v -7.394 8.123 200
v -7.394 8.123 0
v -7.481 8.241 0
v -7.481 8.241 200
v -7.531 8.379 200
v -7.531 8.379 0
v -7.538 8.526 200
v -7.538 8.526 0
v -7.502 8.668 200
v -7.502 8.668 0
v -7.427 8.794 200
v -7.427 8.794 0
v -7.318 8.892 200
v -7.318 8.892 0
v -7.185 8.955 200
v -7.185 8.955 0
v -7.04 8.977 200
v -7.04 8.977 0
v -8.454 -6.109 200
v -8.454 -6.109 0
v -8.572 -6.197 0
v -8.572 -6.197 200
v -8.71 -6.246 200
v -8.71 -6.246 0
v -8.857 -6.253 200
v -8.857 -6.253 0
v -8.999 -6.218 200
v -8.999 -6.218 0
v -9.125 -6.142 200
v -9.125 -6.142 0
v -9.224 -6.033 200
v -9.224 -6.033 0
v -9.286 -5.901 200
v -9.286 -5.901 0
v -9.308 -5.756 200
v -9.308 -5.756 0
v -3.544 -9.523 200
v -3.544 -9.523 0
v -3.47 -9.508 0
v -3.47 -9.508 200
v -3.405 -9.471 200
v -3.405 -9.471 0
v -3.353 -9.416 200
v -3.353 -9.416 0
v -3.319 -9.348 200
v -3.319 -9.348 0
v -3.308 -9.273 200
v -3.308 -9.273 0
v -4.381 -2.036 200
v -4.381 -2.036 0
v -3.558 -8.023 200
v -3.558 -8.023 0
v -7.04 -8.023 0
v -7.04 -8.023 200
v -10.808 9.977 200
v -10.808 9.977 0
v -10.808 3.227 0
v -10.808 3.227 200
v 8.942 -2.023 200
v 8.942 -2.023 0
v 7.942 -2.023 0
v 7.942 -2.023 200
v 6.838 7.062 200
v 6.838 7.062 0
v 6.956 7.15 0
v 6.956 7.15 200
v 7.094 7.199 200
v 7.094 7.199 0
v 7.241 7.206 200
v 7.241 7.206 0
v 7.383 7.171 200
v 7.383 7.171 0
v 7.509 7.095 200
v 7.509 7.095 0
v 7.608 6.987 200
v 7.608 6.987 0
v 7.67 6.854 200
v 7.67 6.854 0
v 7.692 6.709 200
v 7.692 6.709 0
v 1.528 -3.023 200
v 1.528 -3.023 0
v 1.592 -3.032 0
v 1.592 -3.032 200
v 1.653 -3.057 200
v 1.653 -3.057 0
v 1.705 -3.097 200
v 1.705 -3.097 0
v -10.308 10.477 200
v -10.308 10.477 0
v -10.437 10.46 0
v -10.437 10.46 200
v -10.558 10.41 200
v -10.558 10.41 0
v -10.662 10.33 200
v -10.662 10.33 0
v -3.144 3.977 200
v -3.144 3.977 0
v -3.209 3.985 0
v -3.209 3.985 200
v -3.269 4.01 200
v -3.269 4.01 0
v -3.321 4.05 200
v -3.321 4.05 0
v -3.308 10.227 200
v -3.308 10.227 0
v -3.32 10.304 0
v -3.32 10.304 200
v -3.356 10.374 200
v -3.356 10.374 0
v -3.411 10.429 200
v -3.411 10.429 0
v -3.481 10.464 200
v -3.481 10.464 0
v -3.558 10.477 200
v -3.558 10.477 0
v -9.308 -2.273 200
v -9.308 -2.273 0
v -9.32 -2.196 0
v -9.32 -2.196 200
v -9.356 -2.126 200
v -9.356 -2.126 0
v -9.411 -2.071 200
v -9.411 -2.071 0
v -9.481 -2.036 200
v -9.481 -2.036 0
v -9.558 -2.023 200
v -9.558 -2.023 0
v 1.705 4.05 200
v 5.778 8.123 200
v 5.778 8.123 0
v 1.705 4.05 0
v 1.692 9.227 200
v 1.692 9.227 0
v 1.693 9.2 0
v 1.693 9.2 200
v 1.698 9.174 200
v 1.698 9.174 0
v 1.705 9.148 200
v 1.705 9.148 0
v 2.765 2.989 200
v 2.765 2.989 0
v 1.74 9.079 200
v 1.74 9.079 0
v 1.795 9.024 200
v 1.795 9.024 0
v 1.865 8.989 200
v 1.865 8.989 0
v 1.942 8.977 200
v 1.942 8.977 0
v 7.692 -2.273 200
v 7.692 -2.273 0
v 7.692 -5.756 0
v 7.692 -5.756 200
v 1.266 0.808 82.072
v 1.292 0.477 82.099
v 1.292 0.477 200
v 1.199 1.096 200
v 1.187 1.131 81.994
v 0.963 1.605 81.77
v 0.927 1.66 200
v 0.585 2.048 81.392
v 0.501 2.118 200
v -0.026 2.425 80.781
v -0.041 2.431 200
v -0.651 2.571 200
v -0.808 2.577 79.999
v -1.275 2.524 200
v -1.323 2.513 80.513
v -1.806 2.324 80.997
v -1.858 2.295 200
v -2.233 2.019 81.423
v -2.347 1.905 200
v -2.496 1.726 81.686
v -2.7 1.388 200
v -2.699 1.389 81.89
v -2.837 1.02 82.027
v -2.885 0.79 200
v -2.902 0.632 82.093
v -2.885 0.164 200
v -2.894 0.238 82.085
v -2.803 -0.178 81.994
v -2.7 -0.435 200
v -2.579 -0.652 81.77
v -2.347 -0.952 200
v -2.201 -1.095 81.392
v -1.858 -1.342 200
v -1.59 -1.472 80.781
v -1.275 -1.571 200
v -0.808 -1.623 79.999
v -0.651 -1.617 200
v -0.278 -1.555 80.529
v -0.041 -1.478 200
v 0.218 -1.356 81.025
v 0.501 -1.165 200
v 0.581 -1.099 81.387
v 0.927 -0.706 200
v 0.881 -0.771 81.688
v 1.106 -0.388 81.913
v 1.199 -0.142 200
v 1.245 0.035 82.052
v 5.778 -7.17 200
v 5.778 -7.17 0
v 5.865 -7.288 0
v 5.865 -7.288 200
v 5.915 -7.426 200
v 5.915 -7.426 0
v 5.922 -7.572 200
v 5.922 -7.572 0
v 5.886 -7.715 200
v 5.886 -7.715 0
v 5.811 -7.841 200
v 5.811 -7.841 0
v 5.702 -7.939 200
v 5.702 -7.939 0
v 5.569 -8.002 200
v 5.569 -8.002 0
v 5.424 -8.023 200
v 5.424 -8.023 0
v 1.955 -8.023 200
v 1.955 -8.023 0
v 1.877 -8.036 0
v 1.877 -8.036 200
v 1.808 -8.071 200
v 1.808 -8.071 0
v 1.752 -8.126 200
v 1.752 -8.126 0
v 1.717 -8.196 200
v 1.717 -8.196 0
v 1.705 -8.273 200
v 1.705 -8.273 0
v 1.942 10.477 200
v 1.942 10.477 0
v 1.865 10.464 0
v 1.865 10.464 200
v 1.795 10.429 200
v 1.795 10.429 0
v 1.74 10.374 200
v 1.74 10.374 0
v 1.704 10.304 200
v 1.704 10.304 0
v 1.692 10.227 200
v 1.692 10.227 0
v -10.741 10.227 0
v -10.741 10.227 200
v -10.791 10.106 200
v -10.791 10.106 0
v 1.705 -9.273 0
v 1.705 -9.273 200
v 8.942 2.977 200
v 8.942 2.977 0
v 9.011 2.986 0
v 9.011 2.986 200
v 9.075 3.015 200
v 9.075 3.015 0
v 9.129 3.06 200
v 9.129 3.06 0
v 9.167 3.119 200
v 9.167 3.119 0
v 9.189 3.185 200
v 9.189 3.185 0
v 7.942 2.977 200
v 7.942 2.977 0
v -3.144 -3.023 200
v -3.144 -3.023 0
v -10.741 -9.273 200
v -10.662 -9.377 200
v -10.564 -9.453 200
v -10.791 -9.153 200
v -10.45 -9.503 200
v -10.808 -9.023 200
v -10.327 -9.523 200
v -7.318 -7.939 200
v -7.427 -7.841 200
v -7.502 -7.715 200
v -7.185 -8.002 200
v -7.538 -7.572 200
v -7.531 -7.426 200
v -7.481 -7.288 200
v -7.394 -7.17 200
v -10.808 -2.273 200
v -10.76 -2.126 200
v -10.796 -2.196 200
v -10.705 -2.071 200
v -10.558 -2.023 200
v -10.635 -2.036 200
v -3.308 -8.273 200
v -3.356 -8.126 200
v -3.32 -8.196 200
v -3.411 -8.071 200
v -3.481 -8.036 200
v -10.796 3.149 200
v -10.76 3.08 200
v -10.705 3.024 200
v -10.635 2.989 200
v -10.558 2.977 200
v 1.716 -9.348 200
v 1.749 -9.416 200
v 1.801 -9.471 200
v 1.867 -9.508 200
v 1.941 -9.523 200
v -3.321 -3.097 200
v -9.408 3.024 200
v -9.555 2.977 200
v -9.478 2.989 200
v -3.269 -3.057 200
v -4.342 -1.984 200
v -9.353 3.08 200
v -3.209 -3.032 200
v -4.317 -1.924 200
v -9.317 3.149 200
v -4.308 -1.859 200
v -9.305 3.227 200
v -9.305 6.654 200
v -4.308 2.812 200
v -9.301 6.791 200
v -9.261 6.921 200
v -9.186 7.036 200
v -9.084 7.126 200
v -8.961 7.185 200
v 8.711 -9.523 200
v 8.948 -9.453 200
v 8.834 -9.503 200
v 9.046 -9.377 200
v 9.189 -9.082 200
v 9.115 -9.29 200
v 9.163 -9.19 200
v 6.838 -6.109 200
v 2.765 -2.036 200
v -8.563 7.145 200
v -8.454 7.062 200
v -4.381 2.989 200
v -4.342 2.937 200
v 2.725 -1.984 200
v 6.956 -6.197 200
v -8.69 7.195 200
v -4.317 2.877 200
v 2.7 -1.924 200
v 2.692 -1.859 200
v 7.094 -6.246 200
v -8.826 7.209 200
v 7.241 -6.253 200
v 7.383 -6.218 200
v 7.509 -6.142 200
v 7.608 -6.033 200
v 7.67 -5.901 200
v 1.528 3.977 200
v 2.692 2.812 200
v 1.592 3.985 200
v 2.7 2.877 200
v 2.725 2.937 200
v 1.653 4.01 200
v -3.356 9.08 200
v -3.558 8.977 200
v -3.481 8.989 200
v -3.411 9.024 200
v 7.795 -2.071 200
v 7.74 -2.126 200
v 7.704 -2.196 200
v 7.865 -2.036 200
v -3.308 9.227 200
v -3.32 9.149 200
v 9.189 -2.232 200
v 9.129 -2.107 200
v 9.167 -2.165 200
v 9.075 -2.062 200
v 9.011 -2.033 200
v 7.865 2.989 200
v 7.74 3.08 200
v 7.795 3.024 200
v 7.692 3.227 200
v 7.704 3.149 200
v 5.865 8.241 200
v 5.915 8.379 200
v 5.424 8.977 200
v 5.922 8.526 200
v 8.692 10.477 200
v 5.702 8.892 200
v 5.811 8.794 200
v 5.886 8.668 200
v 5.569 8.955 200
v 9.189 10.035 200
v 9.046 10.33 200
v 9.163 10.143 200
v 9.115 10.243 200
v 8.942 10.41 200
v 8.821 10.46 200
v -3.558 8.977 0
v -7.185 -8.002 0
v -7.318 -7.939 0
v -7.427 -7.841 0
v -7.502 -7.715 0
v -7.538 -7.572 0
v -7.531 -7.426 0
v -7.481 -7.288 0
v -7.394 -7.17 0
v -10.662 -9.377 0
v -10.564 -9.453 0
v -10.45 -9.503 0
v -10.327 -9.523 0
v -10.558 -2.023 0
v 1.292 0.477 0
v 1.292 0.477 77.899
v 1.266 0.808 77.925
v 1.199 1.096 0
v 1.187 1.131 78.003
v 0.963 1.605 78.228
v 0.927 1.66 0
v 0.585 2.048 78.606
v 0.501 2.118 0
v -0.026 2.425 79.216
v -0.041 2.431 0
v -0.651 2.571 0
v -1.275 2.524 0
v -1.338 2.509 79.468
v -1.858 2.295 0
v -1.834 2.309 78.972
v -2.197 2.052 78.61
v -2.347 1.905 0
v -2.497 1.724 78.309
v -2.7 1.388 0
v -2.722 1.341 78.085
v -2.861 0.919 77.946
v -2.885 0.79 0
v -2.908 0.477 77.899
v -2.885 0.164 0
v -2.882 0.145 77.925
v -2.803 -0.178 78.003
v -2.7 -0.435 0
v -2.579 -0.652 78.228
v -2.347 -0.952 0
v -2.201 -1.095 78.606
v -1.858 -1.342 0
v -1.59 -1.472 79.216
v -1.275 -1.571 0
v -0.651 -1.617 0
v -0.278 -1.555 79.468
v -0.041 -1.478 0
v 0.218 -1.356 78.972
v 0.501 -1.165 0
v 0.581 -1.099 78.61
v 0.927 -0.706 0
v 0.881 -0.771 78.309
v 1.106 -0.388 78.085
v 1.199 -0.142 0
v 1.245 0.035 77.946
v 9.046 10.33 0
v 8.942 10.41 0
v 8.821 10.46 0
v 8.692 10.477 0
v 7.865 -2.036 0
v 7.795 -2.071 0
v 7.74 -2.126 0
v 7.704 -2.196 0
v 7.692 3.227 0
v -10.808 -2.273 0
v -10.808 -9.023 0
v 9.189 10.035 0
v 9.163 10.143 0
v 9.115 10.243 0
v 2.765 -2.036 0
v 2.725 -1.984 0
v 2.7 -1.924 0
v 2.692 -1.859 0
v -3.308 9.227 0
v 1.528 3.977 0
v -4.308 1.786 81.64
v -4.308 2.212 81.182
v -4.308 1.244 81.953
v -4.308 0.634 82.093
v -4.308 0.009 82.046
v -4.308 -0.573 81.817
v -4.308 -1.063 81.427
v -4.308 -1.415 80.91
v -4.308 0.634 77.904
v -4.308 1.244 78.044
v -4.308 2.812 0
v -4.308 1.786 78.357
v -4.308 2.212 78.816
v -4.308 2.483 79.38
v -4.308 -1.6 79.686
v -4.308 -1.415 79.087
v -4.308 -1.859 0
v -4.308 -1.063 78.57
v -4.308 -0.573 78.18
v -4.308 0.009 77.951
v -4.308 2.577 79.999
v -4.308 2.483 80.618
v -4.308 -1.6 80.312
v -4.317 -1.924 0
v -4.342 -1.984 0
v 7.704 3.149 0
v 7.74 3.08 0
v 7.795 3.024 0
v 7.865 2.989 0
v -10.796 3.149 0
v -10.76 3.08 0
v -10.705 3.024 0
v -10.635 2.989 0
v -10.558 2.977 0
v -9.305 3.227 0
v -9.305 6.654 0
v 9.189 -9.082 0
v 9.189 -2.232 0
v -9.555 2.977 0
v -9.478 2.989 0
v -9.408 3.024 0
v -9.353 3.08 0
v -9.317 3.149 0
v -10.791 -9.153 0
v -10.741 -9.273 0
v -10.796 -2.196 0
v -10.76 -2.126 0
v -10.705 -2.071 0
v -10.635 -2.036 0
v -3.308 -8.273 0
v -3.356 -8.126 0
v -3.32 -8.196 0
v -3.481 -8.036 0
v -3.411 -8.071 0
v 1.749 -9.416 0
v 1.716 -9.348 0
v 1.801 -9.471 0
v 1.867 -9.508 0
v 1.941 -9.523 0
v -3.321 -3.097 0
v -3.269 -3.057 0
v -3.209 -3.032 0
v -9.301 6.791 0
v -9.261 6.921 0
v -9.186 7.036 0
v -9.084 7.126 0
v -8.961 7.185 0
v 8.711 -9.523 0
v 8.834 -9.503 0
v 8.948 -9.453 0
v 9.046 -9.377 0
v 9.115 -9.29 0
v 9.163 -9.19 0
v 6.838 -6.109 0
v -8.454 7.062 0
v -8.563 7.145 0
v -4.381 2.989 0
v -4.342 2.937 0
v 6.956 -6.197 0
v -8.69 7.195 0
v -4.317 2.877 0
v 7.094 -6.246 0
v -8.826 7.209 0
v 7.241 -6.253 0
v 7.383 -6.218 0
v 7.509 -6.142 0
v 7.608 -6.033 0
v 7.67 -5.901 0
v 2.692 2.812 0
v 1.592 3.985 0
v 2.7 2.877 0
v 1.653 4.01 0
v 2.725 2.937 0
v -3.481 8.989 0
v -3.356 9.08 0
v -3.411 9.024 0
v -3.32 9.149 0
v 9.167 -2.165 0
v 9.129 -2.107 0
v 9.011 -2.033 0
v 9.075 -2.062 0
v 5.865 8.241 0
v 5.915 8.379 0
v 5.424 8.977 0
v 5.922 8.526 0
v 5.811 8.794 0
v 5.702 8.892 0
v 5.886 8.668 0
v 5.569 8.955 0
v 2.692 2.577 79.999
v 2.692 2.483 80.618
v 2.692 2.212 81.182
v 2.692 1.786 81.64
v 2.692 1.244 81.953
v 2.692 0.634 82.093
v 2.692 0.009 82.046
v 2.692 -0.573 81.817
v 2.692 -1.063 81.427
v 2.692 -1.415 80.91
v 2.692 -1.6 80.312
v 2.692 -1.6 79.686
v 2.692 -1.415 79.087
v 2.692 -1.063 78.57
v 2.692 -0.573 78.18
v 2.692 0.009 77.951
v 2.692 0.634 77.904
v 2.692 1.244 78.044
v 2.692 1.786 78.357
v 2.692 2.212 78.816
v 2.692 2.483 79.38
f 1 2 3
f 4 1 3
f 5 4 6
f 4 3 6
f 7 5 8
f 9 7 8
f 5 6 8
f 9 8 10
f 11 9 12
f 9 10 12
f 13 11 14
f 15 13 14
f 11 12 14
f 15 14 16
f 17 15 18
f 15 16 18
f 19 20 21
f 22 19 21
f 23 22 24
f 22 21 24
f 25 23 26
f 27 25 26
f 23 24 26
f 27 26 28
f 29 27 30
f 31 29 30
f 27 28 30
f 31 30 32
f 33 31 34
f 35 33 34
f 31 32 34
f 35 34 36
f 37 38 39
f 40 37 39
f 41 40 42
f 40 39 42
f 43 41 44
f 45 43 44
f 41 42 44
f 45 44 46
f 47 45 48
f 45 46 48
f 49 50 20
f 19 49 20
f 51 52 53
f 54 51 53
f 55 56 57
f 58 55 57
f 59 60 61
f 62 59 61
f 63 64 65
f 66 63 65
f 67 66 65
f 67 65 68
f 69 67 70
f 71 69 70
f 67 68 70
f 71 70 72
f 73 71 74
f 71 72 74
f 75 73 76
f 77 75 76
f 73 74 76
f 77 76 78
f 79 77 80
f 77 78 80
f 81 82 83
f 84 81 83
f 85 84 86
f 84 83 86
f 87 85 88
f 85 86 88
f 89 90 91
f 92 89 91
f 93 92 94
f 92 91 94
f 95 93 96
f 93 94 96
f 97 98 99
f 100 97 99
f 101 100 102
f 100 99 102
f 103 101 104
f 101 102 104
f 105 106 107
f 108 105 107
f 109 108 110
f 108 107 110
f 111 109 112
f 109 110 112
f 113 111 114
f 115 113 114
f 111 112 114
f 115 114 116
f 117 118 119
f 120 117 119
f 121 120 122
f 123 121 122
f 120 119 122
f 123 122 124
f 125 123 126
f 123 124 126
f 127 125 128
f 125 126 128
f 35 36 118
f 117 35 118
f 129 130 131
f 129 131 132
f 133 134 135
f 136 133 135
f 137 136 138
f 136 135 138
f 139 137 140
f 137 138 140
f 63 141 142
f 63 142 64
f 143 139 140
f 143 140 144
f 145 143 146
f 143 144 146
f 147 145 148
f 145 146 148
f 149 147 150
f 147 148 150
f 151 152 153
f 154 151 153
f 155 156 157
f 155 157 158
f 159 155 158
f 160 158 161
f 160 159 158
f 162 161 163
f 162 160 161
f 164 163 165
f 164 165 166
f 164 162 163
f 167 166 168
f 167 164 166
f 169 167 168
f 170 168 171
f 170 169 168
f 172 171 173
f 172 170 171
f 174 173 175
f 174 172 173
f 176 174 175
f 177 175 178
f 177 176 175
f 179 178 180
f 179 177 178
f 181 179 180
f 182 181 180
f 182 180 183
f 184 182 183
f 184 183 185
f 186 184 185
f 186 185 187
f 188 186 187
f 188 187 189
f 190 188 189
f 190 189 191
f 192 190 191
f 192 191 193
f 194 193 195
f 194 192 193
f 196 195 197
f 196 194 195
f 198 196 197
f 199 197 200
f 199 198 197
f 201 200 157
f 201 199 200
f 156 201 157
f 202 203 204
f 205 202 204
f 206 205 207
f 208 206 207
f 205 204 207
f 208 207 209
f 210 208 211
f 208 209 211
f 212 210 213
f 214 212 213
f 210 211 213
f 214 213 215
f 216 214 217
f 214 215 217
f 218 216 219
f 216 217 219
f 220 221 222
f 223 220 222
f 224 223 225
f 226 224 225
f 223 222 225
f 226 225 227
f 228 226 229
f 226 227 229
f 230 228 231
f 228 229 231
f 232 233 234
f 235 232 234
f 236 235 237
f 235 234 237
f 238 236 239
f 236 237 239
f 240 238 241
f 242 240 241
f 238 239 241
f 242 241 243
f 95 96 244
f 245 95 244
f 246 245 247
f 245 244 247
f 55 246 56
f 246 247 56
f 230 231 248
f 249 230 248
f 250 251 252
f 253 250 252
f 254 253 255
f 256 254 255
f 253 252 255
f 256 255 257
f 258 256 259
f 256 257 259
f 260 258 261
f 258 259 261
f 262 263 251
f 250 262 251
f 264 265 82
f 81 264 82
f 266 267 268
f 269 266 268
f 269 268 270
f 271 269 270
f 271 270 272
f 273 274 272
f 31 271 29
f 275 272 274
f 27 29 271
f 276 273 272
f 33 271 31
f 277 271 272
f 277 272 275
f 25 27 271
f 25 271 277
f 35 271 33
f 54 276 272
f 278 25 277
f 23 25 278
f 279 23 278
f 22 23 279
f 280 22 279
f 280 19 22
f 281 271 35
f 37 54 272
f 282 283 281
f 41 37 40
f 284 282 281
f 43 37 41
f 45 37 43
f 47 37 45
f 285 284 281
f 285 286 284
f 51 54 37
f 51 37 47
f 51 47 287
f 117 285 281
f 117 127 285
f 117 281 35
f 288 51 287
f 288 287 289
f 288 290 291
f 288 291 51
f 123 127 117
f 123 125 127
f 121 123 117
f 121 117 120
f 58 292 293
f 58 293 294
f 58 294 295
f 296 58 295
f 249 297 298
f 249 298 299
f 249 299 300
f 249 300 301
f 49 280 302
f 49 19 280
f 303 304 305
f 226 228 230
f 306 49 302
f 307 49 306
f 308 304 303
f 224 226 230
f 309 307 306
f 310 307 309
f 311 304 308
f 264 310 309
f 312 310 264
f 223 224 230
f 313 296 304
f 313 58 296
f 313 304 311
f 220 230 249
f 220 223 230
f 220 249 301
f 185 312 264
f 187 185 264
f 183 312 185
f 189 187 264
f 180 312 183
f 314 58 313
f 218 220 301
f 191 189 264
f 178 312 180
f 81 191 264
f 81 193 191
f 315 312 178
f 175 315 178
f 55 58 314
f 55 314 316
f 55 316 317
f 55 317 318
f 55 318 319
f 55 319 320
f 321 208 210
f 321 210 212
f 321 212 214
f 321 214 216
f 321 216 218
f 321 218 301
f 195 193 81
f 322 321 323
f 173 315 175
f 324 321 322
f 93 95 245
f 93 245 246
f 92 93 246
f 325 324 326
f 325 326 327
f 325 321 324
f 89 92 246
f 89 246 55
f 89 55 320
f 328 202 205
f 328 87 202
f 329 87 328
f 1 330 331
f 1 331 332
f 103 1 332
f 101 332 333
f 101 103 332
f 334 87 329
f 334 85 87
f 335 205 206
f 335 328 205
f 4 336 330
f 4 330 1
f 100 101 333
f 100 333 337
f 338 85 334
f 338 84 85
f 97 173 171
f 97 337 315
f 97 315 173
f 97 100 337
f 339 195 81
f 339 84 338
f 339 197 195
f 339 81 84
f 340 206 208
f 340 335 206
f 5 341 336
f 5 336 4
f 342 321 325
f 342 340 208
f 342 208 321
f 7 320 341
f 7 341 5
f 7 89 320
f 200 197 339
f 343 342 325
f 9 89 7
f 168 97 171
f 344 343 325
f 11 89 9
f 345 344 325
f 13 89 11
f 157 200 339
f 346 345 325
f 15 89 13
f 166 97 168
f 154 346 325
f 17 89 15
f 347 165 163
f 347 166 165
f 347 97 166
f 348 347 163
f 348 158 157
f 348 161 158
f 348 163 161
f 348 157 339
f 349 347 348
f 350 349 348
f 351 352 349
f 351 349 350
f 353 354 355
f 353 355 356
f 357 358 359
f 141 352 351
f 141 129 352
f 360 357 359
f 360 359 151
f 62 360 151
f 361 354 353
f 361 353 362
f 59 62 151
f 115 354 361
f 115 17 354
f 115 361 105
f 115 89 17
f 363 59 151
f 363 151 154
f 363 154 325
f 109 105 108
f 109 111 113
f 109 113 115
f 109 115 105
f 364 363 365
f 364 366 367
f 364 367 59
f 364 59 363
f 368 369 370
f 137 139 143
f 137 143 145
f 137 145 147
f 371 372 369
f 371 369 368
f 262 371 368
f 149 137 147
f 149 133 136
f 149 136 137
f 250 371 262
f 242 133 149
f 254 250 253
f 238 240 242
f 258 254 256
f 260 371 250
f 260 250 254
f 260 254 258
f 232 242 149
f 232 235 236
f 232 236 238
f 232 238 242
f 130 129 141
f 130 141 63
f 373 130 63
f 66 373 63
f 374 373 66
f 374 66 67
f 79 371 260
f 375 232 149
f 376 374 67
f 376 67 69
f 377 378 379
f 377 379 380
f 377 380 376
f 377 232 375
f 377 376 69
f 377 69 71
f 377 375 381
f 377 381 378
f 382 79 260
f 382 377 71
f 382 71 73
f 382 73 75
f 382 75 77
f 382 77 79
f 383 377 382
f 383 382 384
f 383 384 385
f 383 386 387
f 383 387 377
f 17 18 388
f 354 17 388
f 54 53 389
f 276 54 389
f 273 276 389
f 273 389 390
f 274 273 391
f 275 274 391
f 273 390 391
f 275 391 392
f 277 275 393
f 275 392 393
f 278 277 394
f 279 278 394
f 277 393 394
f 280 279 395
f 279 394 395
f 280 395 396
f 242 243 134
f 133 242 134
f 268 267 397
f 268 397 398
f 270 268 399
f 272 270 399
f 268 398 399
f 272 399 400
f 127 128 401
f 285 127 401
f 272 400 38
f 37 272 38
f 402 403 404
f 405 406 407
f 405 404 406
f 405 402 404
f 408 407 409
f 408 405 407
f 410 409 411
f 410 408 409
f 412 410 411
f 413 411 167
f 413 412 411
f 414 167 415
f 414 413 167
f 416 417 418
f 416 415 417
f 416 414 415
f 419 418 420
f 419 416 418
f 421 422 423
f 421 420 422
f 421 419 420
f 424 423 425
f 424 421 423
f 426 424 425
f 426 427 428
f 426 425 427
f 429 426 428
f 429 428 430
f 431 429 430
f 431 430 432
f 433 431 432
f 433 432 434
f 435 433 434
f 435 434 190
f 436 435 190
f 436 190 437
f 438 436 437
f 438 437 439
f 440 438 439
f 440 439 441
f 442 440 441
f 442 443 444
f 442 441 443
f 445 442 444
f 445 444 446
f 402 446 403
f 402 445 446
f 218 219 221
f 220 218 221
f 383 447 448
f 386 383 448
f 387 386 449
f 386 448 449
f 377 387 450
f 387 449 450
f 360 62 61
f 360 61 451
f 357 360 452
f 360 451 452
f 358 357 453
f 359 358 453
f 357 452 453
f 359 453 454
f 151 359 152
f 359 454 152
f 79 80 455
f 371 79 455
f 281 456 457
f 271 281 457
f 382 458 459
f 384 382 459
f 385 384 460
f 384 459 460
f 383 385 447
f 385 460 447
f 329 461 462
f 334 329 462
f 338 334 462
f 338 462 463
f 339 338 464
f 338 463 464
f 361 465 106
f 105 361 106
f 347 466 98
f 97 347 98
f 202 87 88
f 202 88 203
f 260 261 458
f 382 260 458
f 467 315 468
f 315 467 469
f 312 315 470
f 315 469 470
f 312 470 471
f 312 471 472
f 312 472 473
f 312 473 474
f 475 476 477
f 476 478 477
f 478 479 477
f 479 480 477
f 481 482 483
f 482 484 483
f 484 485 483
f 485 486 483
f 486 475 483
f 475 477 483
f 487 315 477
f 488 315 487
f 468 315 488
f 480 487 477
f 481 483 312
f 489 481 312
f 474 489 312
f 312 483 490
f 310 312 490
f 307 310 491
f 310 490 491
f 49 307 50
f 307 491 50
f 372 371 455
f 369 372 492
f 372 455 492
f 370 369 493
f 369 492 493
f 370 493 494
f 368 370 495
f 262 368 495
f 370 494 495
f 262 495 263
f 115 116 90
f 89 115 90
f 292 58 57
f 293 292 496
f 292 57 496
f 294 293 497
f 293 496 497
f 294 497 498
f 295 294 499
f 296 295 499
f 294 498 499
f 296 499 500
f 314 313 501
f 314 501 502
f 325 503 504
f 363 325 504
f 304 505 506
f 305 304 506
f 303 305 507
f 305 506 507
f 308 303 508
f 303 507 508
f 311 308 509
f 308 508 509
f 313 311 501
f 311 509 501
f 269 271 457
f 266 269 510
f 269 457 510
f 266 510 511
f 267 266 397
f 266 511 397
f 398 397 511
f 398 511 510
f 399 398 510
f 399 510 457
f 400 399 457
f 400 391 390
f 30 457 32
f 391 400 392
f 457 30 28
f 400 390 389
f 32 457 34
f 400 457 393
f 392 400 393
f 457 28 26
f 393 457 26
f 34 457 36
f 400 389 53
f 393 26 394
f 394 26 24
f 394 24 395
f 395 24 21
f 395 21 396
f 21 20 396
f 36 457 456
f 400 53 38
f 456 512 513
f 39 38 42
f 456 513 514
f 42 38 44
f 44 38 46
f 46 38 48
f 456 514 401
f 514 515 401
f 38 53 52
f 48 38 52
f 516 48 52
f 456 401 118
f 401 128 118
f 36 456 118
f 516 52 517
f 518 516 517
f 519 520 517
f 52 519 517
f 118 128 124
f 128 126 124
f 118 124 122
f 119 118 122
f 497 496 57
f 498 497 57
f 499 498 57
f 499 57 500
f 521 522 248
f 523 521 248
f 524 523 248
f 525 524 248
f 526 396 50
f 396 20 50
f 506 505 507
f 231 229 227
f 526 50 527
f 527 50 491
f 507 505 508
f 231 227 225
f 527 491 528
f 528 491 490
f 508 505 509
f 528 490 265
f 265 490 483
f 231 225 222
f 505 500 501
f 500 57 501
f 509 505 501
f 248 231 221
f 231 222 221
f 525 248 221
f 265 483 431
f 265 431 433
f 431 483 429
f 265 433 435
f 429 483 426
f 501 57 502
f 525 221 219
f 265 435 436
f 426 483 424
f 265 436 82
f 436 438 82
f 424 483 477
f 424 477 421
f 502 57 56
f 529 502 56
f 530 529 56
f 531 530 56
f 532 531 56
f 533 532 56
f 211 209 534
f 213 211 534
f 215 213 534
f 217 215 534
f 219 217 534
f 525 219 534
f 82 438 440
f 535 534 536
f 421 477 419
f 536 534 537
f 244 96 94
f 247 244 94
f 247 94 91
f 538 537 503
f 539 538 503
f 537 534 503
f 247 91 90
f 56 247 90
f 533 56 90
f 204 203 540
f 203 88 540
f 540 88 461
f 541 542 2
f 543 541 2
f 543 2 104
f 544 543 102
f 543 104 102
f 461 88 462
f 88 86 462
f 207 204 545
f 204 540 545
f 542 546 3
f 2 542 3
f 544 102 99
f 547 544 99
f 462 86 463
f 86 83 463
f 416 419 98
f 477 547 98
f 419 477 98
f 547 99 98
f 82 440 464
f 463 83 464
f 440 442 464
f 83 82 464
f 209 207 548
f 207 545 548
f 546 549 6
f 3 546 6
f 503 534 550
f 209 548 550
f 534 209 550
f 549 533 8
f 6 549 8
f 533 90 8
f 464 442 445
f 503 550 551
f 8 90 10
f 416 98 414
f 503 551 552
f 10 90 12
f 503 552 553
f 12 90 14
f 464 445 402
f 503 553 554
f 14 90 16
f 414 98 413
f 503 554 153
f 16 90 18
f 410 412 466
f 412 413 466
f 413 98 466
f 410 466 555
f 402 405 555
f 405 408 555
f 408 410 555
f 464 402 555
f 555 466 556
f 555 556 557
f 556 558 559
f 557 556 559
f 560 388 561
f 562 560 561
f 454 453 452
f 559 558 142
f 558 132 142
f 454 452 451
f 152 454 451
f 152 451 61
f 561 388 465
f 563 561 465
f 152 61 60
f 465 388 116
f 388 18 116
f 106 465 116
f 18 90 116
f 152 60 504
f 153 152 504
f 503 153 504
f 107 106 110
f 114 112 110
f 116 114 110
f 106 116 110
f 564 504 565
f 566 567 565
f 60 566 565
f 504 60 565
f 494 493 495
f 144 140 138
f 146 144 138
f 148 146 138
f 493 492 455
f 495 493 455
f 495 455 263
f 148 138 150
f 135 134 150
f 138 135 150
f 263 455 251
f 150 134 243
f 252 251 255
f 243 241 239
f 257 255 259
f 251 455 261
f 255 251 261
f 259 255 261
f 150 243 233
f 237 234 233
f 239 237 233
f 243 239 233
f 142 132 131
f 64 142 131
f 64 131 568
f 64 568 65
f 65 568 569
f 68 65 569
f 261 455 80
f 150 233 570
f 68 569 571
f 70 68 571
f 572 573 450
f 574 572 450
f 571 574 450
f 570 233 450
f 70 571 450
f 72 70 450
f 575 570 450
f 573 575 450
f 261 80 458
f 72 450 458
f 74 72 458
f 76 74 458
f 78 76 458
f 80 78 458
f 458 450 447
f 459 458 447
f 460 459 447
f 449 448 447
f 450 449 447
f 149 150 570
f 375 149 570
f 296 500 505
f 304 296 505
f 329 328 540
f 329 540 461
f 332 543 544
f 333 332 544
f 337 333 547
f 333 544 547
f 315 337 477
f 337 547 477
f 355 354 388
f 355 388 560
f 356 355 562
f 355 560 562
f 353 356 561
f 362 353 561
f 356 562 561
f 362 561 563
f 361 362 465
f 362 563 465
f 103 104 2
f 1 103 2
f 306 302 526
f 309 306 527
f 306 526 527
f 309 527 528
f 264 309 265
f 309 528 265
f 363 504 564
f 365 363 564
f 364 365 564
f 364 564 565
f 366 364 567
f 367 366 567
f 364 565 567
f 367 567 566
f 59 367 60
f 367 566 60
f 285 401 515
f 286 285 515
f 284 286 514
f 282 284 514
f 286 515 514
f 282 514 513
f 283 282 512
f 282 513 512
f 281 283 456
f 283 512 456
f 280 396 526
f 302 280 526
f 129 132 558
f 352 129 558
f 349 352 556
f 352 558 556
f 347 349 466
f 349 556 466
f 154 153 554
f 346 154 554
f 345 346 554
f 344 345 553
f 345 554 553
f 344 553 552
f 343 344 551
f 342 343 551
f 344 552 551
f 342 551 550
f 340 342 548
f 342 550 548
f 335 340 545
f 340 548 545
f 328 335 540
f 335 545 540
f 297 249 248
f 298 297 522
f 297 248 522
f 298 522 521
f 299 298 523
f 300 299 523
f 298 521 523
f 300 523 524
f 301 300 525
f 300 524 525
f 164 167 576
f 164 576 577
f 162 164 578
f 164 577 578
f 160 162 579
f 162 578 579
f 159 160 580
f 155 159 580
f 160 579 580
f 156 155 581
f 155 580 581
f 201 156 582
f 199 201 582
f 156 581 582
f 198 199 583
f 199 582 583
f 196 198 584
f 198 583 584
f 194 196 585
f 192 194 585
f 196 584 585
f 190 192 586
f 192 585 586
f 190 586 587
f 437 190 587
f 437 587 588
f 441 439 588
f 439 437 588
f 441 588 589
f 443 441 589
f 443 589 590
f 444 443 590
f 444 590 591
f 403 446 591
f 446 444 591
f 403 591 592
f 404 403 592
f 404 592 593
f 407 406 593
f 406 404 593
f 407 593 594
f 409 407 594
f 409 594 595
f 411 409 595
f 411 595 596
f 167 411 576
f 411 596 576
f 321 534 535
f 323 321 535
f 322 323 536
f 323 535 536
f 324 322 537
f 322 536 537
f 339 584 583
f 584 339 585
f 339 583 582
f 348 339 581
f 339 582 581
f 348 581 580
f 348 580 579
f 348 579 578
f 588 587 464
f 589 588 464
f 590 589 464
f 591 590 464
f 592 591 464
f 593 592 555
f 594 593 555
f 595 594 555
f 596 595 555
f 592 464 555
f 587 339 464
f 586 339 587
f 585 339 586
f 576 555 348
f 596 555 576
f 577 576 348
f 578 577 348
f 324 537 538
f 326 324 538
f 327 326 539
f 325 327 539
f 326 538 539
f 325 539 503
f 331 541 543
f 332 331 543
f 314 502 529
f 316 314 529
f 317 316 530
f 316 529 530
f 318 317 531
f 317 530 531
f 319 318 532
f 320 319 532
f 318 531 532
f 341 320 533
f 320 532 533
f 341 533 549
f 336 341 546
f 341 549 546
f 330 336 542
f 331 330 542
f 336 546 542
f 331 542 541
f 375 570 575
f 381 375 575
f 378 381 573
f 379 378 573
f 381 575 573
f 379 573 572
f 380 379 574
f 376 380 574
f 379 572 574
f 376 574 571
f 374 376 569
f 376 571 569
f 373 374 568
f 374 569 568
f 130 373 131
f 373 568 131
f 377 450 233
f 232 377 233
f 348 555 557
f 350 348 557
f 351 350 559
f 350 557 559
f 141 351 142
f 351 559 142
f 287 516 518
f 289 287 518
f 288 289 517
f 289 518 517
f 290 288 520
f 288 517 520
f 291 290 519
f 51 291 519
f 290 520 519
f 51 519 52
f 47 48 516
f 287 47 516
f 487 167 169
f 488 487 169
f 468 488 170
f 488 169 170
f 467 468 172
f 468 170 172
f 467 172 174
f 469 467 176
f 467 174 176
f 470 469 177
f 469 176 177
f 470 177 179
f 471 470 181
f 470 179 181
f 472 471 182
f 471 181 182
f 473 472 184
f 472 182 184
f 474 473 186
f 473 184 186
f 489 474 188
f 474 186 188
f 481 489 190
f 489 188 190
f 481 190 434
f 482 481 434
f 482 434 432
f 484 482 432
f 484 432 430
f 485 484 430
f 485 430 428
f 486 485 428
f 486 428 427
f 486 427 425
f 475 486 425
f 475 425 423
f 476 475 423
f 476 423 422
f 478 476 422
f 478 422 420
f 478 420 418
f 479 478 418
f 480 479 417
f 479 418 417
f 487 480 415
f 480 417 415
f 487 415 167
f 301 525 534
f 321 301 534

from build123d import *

# Parameters (mm, degrees)
F0_R     = 2.1
F1_DEPTH = 200
F2_R     = 2.1
F3_DEPTH = 7


with BuildPart() as f1:
    # F0 (on Top) → F1 (new body)
    with BuildSketch(Plane.XY):
        with BuildLine():
            ThreePointArc((-3.308023, 10.226634), (-3.381246, 10.403411), (-3.558023, 10.476634))
            Line((-3.558023, 10.476634), (-10.308023, 10.476634))
            ThreePointArc((-10.308023, 10.476634), (-10.499365, 10.438574), (-10.661577, 10.330188))
            ThreePointArc((-10.661577, 10.330188), (-10.769963, 10.167976), (-10.808023, 9.976634))
            Line((-10.808023, 9.976634), (-10.808023, 3.226634))
            ThreePointArc((-10.808023, 3.226634), (-10.7348, 3.049858), (-10.558023, 2.976634))
            Line((-10.558023, 2.976634), (-9.555049, 2.976634))
            ThreePointArc((-9.555049, 2.976634), (-9.378272, 3.049858), (-9.305049, 3.226634))
            Line((-9.305049, 3.226634), (-9.305049, 6.654412))
            ThreePointArc((-9.305049, 6.654412), (-9.024273, 7.159685), (-8.45447, 7.062421))
            Line((-8.45447, 7.062421), (-4.381246, 2.989198))
            ThreePointArc((-4.381246, 2.989198), (-4.327053, 2.908092), (-4.308023, 2.812421))
            Line((-4.308023, 2.812421), (-4.308023, -1.859152))
            ThreePointArc((-4.308023, -1.859152), (-4.327053, -1.954823), (-4.381246, -2.035929))
            Line((-4.381246, -2.035929), (-8.45447, -6.109152))
            ThreePointArc((-8.45447, -6.109152), (-8.999365, -6.217538), (-9.308023, -5.755599))
            Line((-9.308023, -5.755599), (-9.308023, -2.273366))
            ThreePointArc((-9.308023, -2.273366), (-9.381246, -2.096589), (-9.558023, -2.023366))
            Line((-9.558023, -2.023366), (-10.558023, -2.023366))
            ThreePointArc((-10.558023, -2.023366), (-10.7348, -2.096589), (-10.808023, -2.273366))
            Line((-10.808023, -2.273366), (-10.808023, -9.023366))
            ThreePointArc((-10.808023, -9.023366), (-10.769963, -9.214707), (-10.661577, -9.376919))
            ThreePointArc((-10.661577, -9.376919), (-10.508248, -9.481525), (-10.327327, -9.522993))
            Line((-10.327327, -9.522993), (-3.544376, -9.522993))
            ThreePointArc((-3.544376, -9.522993), (-3.376486, -9.44525), (-3.308023, -9.273366))
            Line((-3.308023, -9.273366), (-3.308023, -8.273366))
            ThreePointArc((-3.308023, -8.273366), (-3.381246, -8.096589), (-3.558023, -8.023366))
            Line((-3.558023, -8.023366), (-7.040256, -8.023366))
            ThreePointArc((-7.040256, -8.023366), (-7.502196, -7.714707), (-7.39381, -7.169812))
            Line((-7.39381, -7.169812), (-3.320586, -3.096589))
            ThreePointArc((-3.320586, -3.096589), (-3.23948, -3.042396), (-3.14381, -3.023366))
            Line((-3.14381, -3.023366), (1.527763, -3.023366))
            ThreePointArc((1.527763, -3.023366), (1.623434, -3.042396), (1.70454, -3.096589))
            Line((1.70454, -3.096589), (5.777763, -7.169812))
            ThreePointArc((5.777763, -7.169812), (5.88615, -7.714707), (5.42421, -8.023366))
            Line((5.42421, -8.023366), (1.95454, -8.023366))
            ThreePointArc((1.95454, -8.023366), (1.777763, -8.096589), (1.70454, -8.273366))
            Line((1.70454, -8.273366), (1.70454, -9.273366))
            ThreePointArc((1.70454, -9.273366), (1.773002, -9.44525), (1.940893, -9.522993))
            Line((1.940893, -9.522993), (8.711281, -9.522993))
            ThreePointArc((8.711281, -9.522993), (8.892202, -9.481525), (9.04553, -9.376919))
            ThreePointArc((9.04553, -9.376919), (9.141878, -9.241515), (9.188525, -9.082012))
            Line((9.188525, -9.082012), (9.188525, -2.231968))
            ThreePointArc((9.188525, -2.231968), (9.103455, -2.082513), (8.941977, -2.023366))
            Line((8.941977, -2.023366), (7.941977, -2.023366))
            ThreePointArc((7.941977, -2.023366), (7.7652, -2.096589), (7.691977, -2.273366))
            Line((7.691977, -2.273366), (7.691977, -5.755599))
            ThreePointArc((7.691977, -5.755599), (7.383319, -6.217538), (6.838423, -6.109152))
            Line((6.838423, -6.109152), (2.7652, -2.035929))
            ThreePointArc((2.7652, -2.035929), (2.711007, -1.954823), (2.691977, -1.859152))
            Line((2.691977, -1.859152), (2.691977, 2.812421))
            ThreePointArc((2.691977, 2.812421), (2.711007, 2.908092), (2.7652, 2.989198))
            Line((2.7652, 2.989198), (6.838423, 7.062421))
            ThreePointArc((6.838423, 7.062421), (7.383319, 7.170807), (7.691977, 6.708867))
            Line((7.691977, 6.708867), (7.691977, 3.226634))
            ThreePointArc((7.691977, 3.226634), (7.7652, 3.049858), (7.941977, 2.976634))
            Line((7.941977, 2.976634), (8.941977, 2.976634))
            ThreePointArc((8.941977, 2.976634), (9.103455, 3.035782), (9.188525, 3.185237))
            Line((9.188525, 3.185237), (9.188525, 10.035281))
            ThreePointArc((9.188525, 10.035281), (9.141878, 10.194784), (9.04553, 10.330188))
            ThreePointArc((9.04553, 10.330188), (8.883319, 10.438574), (8.691977, 10.476634))
            Line((8.691977, 10.476634), (1.941977, 10.476634))
            ThreePointArc((1.941977, 10.476634), (1.7652, 10.403411), (1.691977, 10.226634))
            Line((1.691977, 10.226634), (1.691977, 9.226634))
            ThreePointArc((1.691977, 9.226634), (1.695138, 9.187006), (1.70454, 9.14838))
            ThreePointArc((1.70454, 9.14838), (1.795456, 9.024071), (1.941977, 8.976634))
            Line((1.941977, 8.976634), (5.42421, 8.976634))
            ThreePointArc((5.42421, 8.976634), (5.88615, 8.667976), (5.777763, 8.123081))
            Line((5.777763, 8.123081), (1.70454, 4.049858))
            ThreePointArc((1.70454, 4.049858), (1.623434, 3.995664), (1.527763, 3.976634))
            Line((1.527763, 3.976634), (-3.14381, 3.976634))
            ThreePointArc((-3.14381, 3.976634), (-3.23948, 3.995664), (-3.320586, 4.049858))
            Line((-3.320586, 4.049858), (-7.39381, 8.123081))
            ThreePointArc((-7.39381, 8.123081), (-7.502196, 8.667976), (-7.040256, 8.976634))
            Line((-7.040256, 8.976634), (-3.558023, 8.976634))
            ThreePointArc((-3.558023, 8.976634), (-3.381246, 9.049858), (-3.308023, 9.226634))
            Line((-3.308023, 9.226634), (-3.308023, 9.726634))
            Line((-3.308023, 9.726634), (-3.308023, 10.226634))
        make_face()
        with Locations((-0.808023, 0.476634)):
            Circle(F0_R, mode=Mode.SUBTRACT)
    extrude(amount=F1_DEPTH)

    # F2 (on face) → F3 (cut)
    with BuildSketch(Plane.YZ.offset(2.691977)):
        with Locations((0.476634, 79.99858)):
            Circle(F2_R)
    extrude(amount=-F3_DEPTH, mode=Mode.SUBTRACT)


solid = f1.part
